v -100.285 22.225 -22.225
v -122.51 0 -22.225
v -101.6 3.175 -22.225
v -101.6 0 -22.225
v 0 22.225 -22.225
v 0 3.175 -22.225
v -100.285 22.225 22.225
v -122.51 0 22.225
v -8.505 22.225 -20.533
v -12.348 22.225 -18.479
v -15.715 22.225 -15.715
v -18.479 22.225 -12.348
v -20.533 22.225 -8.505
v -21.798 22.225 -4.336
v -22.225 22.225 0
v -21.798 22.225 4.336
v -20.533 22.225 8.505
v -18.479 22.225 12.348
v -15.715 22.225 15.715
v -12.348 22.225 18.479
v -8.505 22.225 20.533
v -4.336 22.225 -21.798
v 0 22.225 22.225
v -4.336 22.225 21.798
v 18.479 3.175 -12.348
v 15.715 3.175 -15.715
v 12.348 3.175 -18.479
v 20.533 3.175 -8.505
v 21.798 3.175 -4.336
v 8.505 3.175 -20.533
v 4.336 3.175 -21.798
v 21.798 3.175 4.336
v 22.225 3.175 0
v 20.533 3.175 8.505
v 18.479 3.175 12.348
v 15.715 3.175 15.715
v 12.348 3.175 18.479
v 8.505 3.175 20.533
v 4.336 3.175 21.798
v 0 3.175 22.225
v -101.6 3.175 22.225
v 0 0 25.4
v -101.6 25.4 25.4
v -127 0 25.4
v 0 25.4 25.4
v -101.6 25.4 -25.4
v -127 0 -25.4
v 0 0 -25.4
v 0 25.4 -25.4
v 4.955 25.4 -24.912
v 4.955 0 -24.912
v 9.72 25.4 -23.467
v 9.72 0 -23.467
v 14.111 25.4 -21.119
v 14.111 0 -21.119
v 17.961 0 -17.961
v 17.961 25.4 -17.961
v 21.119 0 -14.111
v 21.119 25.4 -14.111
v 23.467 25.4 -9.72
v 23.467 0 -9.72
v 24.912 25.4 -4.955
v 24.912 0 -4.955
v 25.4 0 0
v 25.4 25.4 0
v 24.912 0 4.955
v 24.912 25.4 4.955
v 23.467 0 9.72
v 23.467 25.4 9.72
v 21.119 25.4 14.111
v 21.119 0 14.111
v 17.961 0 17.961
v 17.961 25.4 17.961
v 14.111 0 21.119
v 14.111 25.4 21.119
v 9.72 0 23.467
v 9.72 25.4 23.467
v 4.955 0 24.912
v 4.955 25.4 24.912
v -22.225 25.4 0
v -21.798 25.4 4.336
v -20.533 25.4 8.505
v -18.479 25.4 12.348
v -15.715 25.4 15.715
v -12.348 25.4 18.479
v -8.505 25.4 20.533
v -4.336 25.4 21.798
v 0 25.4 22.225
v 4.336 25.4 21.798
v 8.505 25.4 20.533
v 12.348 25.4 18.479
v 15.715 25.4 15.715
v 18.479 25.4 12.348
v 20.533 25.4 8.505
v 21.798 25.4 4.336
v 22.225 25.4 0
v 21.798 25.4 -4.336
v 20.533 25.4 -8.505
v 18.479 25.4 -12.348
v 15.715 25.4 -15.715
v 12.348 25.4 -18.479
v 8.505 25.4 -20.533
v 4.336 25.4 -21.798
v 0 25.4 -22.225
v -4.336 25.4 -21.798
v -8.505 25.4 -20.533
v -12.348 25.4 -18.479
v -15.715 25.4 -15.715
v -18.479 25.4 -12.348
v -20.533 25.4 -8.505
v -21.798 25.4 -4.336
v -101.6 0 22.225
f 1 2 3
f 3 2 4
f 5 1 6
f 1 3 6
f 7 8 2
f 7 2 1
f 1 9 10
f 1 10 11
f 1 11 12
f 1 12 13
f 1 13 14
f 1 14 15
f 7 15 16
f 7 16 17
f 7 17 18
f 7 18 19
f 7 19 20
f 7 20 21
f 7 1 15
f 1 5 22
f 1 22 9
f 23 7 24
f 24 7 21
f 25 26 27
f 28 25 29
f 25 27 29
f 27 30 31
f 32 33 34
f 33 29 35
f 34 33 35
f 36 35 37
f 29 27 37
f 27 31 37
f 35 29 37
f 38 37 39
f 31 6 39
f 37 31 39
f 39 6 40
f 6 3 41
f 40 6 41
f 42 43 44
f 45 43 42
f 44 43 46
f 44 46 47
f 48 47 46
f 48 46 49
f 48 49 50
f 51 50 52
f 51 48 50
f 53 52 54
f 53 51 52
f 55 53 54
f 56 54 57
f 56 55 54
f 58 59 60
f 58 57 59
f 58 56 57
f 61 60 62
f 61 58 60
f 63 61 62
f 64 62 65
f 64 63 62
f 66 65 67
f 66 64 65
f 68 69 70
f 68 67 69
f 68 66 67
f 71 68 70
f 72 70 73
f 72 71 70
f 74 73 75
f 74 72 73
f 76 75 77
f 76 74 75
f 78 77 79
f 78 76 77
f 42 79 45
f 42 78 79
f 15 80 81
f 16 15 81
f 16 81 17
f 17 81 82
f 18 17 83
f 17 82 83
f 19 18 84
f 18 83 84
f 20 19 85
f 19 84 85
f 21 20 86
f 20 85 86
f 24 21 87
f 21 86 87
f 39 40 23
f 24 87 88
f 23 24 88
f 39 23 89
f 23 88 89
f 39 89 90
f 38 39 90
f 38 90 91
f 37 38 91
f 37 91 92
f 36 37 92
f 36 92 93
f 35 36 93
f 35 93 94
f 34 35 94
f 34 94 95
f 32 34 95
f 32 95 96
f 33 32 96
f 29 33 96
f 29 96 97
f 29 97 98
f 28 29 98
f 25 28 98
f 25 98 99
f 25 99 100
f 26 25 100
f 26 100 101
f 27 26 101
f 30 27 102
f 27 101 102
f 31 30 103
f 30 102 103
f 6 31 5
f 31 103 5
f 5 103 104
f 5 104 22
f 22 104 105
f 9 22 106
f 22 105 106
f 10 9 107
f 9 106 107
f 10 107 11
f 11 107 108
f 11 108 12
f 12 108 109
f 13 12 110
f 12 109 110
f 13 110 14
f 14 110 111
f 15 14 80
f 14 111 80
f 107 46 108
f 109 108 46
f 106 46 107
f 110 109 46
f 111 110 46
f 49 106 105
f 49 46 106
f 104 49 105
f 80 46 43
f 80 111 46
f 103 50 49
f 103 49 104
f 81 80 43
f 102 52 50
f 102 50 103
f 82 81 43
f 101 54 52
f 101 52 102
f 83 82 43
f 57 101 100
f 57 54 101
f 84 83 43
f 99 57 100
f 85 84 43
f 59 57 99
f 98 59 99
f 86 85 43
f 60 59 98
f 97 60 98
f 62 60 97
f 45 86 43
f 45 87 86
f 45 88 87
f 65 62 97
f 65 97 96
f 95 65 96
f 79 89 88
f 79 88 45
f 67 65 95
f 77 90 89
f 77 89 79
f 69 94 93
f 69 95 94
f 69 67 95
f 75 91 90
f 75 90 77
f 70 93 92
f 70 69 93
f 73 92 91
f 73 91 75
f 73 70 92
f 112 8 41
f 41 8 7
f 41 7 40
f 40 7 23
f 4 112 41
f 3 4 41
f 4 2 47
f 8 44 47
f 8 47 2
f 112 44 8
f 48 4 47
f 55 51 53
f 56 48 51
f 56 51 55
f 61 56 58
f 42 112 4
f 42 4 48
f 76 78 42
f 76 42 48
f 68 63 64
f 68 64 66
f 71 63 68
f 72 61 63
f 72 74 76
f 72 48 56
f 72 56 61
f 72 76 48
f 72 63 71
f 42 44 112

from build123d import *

# Parameters (mm, degrees)
F0_R      = 25.4
F1_DEPTH  = 25.4
F2_W      = 25.4
F2_H      = 50.8
F3_DEPTH  = 101.6
F4_W      = 19.05
F4_H      = 44.45
F5_DEPTH  = 101.6
F6_R      = 22.225
F7_DEPTH  = 22.225
F9_DEPTH  = 3.175
F11_DEPTH = 3.175
F13_DEPTH = 50.8


with BuildPart() as f1:
    # F0 (on Front) → F1 (new body)
    with BuildSketch(Plane.XZ):
        Circle(F0_R)
    extrude(amount=-F1_DEPTH)

    # F2 (on Right) → F3 (join)
    with BuildSketch(Plane.YZ):
        with Locations((12.7, 0)):
            Rectangle(F2_W, F2_H)
    extrude(amount=-F3_DEPTH)

    # F4 (on face) → F5 (cut)
    with BuildSketch(Plane(origin=(-101.6, 0, 0), x_dir=(0, -1, 0), z_dir=(-1, 0, 0))):
        with Locations((-12.7, 0)):
            Rectangle(F4_W, F4_H)
    extrude(amount=-F5_DEPTH, mode=Mode.SUBTRACT)

    # F6 (on face) → F7 (cut)
    with BuildSketch(Plane(origin=(0, 25.4, 0), x_dir=(-1, 0, 0), z_dir=(0, 1, 0))):
        Circle(F6_R)
    extrude(amount=-F7_DEPTH, mode=Mode.SUBTRACT)

    # F8 (on face) → F9 (join)
    with BuildSketch(Plane(origin=(0, 0, -25.4), x_dir=(1, 0, 0), z_dir=(0, 0, -1))):
        Polygon((-127, 0), (-101.6, -25.4), (-101.6, 0), align=None)
    extrude(amount=-F9_DEPTH)

    # F10 (on face) → F11 (join)
    with BuildSketch(Plane.XY.offset(25.4)):
        Polygon((-101.6, 0), (-101.6, 25.4), (-127, 0), align=None)
    extrude(amount=-F11_DEPTH)

    # F12 (on face) → F13 (join)
    with BuildSketch(Plane.XY.offset(25.4)):
        Polygon((-97.109872, 25.4), (-101.6, 25.4), (-127, 0), (-122.509872, 0), align=None)
    extrude(amount=-F13_DEPTH)


solid = f1.part
